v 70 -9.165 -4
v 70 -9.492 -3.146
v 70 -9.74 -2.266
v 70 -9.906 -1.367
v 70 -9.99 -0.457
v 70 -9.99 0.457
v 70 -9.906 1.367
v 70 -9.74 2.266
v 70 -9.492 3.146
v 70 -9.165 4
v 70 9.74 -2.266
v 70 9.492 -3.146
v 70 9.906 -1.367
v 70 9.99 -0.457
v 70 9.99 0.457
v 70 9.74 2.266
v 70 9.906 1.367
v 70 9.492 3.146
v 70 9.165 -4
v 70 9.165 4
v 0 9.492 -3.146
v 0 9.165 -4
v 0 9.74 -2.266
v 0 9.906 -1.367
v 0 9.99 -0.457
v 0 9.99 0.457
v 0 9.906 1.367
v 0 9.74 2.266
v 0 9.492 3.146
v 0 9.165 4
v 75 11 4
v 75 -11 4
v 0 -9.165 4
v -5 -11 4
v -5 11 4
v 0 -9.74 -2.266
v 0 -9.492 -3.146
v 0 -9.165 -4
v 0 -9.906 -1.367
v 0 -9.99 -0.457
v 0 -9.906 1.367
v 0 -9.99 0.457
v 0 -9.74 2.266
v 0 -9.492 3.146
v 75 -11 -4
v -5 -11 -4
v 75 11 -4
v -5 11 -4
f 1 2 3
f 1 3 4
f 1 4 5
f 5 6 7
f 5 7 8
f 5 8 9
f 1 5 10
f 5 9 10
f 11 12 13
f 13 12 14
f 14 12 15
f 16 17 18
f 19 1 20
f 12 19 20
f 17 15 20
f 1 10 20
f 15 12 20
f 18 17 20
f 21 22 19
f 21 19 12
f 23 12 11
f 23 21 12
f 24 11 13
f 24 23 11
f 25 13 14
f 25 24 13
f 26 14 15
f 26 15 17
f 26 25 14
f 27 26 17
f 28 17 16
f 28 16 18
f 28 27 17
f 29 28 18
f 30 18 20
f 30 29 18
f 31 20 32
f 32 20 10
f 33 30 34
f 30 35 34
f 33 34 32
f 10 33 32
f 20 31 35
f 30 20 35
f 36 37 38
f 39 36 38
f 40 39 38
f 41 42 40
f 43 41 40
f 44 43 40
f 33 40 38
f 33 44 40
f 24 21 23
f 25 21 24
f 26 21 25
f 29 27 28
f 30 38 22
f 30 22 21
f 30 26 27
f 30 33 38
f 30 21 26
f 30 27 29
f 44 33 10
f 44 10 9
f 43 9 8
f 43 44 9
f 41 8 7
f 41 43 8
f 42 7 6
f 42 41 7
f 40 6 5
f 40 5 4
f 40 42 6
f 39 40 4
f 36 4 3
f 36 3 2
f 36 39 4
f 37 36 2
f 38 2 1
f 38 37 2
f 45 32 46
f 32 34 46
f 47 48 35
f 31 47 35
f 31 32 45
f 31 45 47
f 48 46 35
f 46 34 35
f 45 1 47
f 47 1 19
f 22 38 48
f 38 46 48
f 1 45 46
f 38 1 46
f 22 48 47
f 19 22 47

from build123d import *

# Parameters (mm, degrees)
F1_DEPTH = 5
F2_DEPTH = 75
F3_DEPTH = 70


with BuildPart() as f1:
    # F0 (on Right) → F1 (new body)
    with BuildSketch(Plane.YZ):
        with BuildLine():
            Line((-11, -4), (-9.165151, -4))
            ThreePointArc((-9.165151, -4), (-10, 0), (-9.165151, 4))
            Line((-9.165151, 4), (-11, 4))
            Line((-11, 4), (-11, -4))
        make_face()
        with BuildLine():
            Line((-9.165151, -4), (9.165151, -4))
            ThreePointArc((9.165151, -4), (10, 0), (9.165151, 4))
            Line((9.165151, 4), (-9.165151, 4))
            ThreePointArc((-9.165151, 4), (-10, 0), (-9.165151, -4))
        make_face()
        with BuildLine():
            Line((9.165151, -4), (11, -4))
            Line((11, -4), (11, 4))
            Line((11, 4), (9.165151, 4))
            ThreePointArc((9.165151, 4), (10, 0), (9.165151, -4))
        make_face()
    extrude(amount=-F1_DEPTH)

    # F0 (on Right) → F2 (join)
    with BuildSketch(Plane.YZ):
        with BuildLine():
            Line((9.165151, -4), (11, -4))
            Line((11, -4), (11, 4))
            Line((11, 4), (9.165151, 4))
            ThreePointArc((9.165151, 4), (10, 0), (9.165151, -4))
        make_face()
        with BuildLine():
            Line((-9.165151, -4), (9.165151, -4))
            ThreePointArc((9.165151, -4), (10, 0), (9.165151, 4))
            Line((9.165151, 4), (-9.165151, 4))
            ThreePointArc((-9.165151, 4), (-10, 0), (-9.165151, -4))
        make_face()
        with BuildLine():
            Line((-11, -4), (-9.165151, -4))
            ThreePointArc((-9.165151, -4), (-10, 0), (-9.165151, 4))
            Line((-9.165151, 4), (-11, 4))
            Line((-11, 4), (-11, -4))
        make_face()
    extrude(amount=F2_DEPTH)

    # F0 (on Right) → F3 (cut)
    with BuildSketch(Plane.YZ):
        with BuildLine():
            Line((-9.165151, -4), (9.165151, -4))
            ThreePointArc((9.165151, -4), (10, 0), (9.165151, 4))
            Line((9.165151, 4), (-9.165151, 4))
            ThreePointArc((-9.165151, 4), (-10, 0), (-9.165151, -4))
        make_face()
    extrude(amount=F3_DEPTH, mode=Mode.SUBTRACT)


solid = f1.part
